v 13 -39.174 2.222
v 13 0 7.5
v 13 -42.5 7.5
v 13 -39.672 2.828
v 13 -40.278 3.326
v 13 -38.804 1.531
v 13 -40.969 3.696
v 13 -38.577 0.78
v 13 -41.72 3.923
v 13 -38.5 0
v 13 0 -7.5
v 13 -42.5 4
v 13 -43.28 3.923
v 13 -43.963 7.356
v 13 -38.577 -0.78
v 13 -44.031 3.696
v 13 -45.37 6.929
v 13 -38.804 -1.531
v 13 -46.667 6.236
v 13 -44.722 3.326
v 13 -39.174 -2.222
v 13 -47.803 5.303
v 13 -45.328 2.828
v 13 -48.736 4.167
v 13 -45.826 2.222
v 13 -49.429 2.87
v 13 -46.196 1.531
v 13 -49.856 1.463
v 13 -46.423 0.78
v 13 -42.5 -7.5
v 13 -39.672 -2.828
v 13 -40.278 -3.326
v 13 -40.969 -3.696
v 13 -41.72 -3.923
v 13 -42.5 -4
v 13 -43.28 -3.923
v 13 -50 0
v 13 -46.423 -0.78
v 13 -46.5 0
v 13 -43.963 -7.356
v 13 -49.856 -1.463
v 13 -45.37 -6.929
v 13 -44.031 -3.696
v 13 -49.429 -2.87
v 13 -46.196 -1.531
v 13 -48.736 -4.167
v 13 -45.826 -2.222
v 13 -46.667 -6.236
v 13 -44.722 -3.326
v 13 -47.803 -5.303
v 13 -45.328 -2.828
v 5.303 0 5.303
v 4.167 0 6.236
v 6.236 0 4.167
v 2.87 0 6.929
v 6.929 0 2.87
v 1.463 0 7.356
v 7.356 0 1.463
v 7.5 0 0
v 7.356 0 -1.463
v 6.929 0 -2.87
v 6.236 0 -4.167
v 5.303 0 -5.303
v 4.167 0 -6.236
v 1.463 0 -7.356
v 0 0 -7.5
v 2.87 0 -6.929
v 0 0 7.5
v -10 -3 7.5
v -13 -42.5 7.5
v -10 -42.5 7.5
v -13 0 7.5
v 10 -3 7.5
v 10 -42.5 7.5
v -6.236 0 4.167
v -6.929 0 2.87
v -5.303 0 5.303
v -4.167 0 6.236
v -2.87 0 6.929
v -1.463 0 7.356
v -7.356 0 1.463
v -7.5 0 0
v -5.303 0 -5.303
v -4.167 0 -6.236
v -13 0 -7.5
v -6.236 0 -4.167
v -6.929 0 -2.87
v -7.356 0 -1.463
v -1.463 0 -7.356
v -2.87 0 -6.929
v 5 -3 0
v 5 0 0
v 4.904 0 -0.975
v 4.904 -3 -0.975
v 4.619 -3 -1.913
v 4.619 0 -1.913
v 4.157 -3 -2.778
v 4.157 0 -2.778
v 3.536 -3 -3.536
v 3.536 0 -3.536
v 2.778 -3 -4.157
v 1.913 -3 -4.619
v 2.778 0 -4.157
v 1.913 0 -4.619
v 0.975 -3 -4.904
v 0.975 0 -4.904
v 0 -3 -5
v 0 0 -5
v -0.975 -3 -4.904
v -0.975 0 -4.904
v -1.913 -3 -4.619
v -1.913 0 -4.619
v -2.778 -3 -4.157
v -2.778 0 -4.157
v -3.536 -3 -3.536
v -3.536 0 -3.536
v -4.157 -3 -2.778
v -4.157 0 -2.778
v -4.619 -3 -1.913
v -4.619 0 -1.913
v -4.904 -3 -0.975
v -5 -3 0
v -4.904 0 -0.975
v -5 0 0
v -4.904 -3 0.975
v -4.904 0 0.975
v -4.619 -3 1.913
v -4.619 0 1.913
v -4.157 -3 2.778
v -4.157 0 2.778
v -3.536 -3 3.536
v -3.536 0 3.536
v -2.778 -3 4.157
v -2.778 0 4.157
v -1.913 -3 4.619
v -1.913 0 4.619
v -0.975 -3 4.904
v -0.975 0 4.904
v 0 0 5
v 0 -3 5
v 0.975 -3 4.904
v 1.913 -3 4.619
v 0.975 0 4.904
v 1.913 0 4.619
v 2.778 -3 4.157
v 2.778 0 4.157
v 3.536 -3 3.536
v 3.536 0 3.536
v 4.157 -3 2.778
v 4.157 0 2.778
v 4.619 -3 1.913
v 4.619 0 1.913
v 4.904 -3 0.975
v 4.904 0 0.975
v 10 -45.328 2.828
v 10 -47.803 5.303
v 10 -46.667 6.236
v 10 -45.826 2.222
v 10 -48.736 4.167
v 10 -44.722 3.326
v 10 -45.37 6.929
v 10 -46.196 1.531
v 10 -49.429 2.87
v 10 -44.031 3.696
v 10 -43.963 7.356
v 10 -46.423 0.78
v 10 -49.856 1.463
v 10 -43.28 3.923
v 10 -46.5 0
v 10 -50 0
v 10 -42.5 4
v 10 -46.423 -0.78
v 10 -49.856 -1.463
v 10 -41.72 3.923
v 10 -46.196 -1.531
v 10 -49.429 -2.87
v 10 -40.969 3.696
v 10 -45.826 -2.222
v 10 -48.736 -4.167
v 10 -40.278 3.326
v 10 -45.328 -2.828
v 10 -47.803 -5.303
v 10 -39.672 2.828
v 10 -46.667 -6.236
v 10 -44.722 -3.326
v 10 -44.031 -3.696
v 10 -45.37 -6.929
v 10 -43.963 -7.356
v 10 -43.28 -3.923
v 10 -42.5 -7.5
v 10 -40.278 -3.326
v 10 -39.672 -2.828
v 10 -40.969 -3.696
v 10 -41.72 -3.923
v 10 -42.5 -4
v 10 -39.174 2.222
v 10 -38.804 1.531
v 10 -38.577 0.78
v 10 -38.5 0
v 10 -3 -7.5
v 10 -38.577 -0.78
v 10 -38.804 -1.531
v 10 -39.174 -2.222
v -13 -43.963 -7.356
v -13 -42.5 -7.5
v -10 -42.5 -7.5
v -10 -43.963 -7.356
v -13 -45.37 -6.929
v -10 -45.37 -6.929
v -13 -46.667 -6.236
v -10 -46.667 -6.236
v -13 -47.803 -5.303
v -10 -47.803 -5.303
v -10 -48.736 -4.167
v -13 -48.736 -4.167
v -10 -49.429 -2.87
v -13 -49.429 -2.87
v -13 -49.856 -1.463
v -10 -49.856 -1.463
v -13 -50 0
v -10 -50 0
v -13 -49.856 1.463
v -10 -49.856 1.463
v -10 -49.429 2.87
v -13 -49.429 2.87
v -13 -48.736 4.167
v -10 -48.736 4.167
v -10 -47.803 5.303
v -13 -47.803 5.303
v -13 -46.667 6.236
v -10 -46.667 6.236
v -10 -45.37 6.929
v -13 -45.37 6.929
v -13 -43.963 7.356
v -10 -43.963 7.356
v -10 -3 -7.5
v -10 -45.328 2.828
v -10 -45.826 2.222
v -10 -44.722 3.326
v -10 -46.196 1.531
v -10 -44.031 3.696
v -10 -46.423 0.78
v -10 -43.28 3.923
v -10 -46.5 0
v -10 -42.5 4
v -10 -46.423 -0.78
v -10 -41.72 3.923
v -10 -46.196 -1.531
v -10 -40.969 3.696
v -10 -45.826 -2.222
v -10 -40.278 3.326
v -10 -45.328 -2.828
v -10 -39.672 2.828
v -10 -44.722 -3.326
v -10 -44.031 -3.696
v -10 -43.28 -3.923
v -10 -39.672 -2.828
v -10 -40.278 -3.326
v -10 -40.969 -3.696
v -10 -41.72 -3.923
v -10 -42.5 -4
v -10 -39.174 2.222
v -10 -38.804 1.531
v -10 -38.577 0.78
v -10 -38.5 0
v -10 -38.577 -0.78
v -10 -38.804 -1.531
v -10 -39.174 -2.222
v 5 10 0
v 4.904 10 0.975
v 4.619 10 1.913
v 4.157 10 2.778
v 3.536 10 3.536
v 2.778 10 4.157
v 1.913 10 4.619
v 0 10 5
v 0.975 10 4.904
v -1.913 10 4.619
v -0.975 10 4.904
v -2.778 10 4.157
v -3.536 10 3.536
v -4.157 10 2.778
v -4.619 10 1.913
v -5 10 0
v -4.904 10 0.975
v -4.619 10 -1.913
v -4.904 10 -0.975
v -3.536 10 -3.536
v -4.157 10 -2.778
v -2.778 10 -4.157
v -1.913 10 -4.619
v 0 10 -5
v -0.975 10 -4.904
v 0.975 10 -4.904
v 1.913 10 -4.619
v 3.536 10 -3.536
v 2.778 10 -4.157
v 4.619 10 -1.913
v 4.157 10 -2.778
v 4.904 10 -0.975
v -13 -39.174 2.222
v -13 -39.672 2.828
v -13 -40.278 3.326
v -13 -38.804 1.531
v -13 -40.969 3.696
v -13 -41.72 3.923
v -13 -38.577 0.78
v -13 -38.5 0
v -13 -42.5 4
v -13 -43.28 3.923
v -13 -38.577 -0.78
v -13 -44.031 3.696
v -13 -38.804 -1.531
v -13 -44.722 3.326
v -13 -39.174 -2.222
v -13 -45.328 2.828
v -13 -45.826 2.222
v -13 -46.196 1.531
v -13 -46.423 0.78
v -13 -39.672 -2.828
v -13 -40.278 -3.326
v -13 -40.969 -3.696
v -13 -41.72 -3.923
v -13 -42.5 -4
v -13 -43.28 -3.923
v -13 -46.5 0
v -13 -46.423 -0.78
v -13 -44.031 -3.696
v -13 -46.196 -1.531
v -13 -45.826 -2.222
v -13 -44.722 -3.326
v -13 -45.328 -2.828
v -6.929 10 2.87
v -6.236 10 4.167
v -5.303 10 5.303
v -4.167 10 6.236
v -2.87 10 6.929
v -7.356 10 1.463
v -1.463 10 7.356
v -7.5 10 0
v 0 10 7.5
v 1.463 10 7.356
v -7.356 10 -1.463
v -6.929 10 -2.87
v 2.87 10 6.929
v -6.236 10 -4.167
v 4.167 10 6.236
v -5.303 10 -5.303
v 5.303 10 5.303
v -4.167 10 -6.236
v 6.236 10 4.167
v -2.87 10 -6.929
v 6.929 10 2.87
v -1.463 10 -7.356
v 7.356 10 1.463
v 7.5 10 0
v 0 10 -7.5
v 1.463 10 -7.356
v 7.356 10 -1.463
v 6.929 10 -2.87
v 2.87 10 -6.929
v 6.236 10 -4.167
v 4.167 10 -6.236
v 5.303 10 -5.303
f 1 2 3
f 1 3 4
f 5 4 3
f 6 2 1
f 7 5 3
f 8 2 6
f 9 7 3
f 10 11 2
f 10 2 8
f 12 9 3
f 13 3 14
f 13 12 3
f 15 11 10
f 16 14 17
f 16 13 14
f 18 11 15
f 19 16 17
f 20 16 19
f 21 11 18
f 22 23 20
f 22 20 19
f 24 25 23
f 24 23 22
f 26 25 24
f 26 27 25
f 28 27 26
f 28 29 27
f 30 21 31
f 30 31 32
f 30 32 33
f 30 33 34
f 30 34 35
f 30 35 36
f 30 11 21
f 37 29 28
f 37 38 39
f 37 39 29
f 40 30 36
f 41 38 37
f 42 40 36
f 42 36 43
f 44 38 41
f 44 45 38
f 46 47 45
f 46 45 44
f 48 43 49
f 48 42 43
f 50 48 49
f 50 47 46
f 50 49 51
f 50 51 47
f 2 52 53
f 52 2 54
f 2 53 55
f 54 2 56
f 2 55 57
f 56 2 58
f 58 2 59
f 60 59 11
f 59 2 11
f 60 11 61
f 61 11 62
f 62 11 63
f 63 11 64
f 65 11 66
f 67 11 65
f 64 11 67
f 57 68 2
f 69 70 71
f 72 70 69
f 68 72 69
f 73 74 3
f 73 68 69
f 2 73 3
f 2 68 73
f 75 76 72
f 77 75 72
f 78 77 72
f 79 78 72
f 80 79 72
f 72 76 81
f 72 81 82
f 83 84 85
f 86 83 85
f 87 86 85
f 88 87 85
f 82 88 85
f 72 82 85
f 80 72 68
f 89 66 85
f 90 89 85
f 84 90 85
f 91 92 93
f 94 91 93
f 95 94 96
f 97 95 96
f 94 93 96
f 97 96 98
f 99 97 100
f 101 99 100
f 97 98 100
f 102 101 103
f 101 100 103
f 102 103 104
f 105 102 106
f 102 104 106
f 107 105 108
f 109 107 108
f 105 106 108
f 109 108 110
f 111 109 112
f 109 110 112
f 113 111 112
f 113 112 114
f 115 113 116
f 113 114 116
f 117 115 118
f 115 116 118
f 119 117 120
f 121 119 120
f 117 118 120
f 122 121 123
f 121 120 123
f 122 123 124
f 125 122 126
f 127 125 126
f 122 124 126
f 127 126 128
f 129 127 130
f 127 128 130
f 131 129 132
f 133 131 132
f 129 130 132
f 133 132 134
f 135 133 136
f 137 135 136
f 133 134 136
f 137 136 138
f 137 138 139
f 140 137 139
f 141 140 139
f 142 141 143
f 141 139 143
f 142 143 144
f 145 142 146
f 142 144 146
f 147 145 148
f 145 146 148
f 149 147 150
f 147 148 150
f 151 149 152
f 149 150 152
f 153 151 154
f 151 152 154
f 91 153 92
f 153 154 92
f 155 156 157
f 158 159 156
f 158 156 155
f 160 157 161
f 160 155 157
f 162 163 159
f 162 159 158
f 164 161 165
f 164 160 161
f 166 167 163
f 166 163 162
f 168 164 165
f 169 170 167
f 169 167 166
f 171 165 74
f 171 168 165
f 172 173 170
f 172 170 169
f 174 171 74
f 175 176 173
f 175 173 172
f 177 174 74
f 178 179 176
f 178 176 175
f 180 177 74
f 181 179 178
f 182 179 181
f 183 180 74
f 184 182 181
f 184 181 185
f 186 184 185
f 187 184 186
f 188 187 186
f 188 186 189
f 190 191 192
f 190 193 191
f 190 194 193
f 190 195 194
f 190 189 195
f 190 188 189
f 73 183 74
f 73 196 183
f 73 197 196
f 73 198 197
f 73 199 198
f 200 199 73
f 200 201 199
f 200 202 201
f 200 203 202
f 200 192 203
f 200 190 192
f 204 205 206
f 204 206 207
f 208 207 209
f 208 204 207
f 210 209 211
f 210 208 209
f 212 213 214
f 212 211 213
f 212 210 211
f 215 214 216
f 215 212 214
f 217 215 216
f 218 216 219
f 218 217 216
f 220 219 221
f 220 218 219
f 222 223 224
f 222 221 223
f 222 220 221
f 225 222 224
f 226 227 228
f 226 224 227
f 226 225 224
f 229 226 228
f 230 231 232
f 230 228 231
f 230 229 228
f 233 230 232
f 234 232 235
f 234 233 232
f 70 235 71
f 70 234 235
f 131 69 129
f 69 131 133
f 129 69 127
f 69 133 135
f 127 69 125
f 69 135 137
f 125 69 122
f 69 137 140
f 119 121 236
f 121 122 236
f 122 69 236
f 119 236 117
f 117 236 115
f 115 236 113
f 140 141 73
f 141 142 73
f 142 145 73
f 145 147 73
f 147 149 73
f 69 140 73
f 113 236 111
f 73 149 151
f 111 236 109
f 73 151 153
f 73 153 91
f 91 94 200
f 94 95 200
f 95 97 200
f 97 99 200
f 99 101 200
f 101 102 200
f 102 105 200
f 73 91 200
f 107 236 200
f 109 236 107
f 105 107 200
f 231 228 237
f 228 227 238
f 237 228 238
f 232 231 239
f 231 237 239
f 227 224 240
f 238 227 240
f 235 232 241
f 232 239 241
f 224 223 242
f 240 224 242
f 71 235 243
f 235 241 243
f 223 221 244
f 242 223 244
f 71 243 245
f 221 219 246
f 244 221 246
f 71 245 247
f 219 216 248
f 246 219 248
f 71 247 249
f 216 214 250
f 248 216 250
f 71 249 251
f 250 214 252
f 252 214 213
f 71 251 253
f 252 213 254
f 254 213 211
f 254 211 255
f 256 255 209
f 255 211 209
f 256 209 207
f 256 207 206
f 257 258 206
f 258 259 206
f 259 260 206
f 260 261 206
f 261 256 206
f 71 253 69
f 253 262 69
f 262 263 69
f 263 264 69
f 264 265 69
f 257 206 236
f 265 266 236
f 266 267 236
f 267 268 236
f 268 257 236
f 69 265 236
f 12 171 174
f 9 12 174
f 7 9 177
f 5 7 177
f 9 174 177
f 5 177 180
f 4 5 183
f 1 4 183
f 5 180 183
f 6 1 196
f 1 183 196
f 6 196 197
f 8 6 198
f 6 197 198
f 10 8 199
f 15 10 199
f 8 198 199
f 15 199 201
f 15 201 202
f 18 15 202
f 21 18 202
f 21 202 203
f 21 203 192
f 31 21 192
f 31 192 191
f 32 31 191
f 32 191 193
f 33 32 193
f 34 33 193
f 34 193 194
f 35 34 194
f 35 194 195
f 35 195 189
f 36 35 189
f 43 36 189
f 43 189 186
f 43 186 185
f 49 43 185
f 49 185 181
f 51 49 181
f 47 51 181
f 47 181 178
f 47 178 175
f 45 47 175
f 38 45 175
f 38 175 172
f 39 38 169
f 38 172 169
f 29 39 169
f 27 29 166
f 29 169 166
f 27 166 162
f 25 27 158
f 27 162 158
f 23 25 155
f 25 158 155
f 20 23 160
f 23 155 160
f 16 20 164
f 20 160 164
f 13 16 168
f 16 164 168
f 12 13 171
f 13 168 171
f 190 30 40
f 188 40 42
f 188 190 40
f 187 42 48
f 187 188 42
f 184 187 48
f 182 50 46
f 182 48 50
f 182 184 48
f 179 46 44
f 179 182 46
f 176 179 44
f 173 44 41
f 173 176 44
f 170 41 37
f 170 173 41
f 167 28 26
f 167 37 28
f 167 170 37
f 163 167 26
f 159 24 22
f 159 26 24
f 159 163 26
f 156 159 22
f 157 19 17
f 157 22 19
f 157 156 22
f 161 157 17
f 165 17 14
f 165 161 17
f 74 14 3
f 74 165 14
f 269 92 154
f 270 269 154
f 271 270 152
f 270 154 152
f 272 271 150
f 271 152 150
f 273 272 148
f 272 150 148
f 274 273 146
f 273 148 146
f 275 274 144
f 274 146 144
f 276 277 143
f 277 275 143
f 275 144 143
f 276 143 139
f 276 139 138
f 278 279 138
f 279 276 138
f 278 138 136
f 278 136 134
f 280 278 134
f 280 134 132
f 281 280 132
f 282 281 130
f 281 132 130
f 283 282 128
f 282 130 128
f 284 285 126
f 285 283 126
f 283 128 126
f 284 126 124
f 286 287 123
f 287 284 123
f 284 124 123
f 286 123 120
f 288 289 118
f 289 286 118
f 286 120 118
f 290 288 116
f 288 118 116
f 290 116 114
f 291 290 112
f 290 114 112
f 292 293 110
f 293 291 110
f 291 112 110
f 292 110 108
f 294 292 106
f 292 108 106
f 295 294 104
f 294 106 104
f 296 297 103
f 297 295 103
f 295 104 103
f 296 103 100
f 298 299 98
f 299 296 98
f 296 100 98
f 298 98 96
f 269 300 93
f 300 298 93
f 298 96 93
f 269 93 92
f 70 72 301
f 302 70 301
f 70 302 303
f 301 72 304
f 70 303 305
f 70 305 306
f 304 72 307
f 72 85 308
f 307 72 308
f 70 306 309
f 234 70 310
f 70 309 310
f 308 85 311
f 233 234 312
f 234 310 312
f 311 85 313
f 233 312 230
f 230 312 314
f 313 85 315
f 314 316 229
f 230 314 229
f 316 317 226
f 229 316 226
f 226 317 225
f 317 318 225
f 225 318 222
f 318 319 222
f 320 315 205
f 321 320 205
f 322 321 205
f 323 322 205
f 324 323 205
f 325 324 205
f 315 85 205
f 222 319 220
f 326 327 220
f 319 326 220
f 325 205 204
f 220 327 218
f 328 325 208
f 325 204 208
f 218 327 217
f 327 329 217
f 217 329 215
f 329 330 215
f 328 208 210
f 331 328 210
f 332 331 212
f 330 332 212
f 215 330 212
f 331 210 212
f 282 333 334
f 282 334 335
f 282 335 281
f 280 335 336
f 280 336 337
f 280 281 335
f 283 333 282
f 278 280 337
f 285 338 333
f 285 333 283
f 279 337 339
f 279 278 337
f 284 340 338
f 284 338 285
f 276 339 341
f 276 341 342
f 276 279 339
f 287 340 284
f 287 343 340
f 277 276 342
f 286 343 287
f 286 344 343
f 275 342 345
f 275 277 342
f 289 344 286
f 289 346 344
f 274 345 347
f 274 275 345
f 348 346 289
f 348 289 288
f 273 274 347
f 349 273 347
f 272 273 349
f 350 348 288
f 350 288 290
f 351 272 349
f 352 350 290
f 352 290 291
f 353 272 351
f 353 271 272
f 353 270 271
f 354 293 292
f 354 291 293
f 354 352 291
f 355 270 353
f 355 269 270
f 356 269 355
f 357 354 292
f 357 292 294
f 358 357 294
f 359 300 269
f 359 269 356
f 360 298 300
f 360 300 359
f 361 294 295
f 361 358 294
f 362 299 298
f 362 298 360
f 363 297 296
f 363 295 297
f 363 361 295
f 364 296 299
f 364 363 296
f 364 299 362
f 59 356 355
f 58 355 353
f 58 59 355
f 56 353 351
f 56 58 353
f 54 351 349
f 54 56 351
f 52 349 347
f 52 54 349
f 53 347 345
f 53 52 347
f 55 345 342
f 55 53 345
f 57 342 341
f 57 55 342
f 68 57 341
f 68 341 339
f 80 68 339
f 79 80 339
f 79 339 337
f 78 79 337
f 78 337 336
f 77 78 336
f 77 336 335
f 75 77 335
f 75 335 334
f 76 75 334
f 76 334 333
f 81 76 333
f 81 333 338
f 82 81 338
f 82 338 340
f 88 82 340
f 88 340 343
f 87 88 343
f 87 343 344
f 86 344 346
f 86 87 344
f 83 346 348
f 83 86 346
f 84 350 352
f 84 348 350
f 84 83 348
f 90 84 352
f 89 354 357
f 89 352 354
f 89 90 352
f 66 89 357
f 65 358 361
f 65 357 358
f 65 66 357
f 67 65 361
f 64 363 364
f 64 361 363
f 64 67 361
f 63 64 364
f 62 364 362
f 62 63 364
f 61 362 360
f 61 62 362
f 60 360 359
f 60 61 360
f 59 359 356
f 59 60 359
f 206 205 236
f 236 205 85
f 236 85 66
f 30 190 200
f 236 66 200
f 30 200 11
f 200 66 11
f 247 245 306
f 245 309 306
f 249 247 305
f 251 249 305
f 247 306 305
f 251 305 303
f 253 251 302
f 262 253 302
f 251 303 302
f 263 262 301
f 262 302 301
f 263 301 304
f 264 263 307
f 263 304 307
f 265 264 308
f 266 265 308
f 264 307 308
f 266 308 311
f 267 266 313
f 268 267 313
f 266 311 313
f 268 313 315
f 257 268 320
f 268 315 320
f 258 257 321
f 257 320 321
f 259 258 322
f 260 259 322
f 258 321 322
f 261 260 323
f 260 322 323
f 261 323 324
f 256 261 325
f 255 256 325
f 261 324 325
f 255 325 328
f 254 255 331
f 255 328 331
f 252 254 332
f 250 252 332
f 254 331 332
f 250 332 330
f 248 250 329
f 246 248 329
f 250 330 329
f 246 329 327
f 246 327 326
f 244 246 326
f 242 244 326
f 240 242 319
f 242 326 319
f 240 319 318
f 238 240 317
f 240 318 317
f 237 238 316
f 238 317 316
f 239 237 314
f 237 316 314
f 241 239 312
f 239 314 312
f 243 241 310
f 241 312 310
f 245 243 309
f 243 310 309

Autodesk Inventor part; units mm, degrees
ref_plane "YZ Plane" through (0, 0, 0) normal (1, 0, 0) x (0, 1, 0)
ref_plane "XZ Plane" through (0, 0, 0) normal (0, 1, 0) x (-1, 0, 0)
ref_plane "XY Plane" through (0, 0, 0) normal (0, 0, 1) x (1, 0, 0)
sketch "Skizze1" plane through (0, 0, 0) normal (0, 0, 1) x (1, 0, 0)
  line L0 (0, 0) -> (-13, 0)
  line L1 (-13, 0) -> (-13, -50)
  line L2 (-13, -50) -> (-10, -50)
  line L3 (-10, -50) -> (-10, -3)
  line L4 (-10, -3) -> (0, -3)
  line L5 (0, -3) -> (0, 0)
  line L6 (-13, 0) -> (0, 0)
  line L7 (0, 10) -> (0, -60) projected
  line L8 (0, 0) -> (13, 0)
  line L9 (13, 0) -> (13, -50)
  line L10 (13, -50) -> (10, -50)
  line L11 (10, -50) -> (10, -3)
  line L12 (10, -3) -> (0, -3)
  line L13 (13, 0) -> (0, 0)
  dimension "d0" = 13
  dimension "d1" = 50
  dimension "d2" = 3
  dimension "d3" = 47
extrude "Extrusion1" add sketch "Skizze1" along normal mid plane 15
sketch "Skizze2" plane through (-13, -50, 7.5) normal (-1, 0, 0) x (0, 0, 1)
  line L0 (-15, 0) -> (-15, 50) projected
  line L1 (-15, 0) -> (0, 0) projected
  line L2 (-15, 50) -> (0, 50)
  line L3 (0, 50) -> (0, 7.5)
  line L4 (-7.5, 0) -> (-7.5, 0)
  line L5 (-15, 7.5) -> (-15, 50)
  arc A0 (-15, 7.5) -> (-7.5, 0) centre (-7.5, 7.5) ccw
  arc A1 (-7.5, 0) -> (0, 7.5) centre (-7.5, 7.5) ccw
  circle A2 centre (-7.5, 7.5) radius 4
  line L6 (-15, 50) -> (0, 50)
  line L7 (0, 50) -> (0, 0)
  line L8 (0, 0) -> (-15, 0)
  line L9 (-15, 0) -> (-15, 50)
  point P0 (-7.5, 50)
  point P1 (0, 7.5)
  point P2 (-7.5, 0)
  point P3 (-7.5, 0)
  point P4 (-7.5, 0)
  point P5 (-15, 7.5)
  dimension "d6" = 7.5
  dimension "d7" = 8
extrude "Extrusion2" cut sketch "Skizze2" against normal through all contours L0 A0 L1 | A1 L7 L1 | A2
sketch "Skizze3" plane through (-13, 0, 7.5) normal (0, 1, 0) x (1, 0, 0)
  circle A0 centre (13, 7.5) radius 5
  dimension "d10" = 10
extrude "Extrusion3" cut sketch "Skizze3" against normal through all
sketch "Skizze4" plane through (-13, 0, 7.5) normal (0, 1, 0) x (1, 0, 0)
  circle A0 centre (13, 7.5) radius 5 projected
  circle A1 centre (13, 7.5) radius 5
  circle A2 centre (13, 7.5) radius 7.5
  dimension "d13" = 2.5
extrude "Extrusion4" add sketch "Skizze4" along normal blind 10
thread "Gewinde1" size "M10x1.5" class "6H" standard "ANSI Metric M Profile" full length
properties part number "ustück" material "Stahl"
